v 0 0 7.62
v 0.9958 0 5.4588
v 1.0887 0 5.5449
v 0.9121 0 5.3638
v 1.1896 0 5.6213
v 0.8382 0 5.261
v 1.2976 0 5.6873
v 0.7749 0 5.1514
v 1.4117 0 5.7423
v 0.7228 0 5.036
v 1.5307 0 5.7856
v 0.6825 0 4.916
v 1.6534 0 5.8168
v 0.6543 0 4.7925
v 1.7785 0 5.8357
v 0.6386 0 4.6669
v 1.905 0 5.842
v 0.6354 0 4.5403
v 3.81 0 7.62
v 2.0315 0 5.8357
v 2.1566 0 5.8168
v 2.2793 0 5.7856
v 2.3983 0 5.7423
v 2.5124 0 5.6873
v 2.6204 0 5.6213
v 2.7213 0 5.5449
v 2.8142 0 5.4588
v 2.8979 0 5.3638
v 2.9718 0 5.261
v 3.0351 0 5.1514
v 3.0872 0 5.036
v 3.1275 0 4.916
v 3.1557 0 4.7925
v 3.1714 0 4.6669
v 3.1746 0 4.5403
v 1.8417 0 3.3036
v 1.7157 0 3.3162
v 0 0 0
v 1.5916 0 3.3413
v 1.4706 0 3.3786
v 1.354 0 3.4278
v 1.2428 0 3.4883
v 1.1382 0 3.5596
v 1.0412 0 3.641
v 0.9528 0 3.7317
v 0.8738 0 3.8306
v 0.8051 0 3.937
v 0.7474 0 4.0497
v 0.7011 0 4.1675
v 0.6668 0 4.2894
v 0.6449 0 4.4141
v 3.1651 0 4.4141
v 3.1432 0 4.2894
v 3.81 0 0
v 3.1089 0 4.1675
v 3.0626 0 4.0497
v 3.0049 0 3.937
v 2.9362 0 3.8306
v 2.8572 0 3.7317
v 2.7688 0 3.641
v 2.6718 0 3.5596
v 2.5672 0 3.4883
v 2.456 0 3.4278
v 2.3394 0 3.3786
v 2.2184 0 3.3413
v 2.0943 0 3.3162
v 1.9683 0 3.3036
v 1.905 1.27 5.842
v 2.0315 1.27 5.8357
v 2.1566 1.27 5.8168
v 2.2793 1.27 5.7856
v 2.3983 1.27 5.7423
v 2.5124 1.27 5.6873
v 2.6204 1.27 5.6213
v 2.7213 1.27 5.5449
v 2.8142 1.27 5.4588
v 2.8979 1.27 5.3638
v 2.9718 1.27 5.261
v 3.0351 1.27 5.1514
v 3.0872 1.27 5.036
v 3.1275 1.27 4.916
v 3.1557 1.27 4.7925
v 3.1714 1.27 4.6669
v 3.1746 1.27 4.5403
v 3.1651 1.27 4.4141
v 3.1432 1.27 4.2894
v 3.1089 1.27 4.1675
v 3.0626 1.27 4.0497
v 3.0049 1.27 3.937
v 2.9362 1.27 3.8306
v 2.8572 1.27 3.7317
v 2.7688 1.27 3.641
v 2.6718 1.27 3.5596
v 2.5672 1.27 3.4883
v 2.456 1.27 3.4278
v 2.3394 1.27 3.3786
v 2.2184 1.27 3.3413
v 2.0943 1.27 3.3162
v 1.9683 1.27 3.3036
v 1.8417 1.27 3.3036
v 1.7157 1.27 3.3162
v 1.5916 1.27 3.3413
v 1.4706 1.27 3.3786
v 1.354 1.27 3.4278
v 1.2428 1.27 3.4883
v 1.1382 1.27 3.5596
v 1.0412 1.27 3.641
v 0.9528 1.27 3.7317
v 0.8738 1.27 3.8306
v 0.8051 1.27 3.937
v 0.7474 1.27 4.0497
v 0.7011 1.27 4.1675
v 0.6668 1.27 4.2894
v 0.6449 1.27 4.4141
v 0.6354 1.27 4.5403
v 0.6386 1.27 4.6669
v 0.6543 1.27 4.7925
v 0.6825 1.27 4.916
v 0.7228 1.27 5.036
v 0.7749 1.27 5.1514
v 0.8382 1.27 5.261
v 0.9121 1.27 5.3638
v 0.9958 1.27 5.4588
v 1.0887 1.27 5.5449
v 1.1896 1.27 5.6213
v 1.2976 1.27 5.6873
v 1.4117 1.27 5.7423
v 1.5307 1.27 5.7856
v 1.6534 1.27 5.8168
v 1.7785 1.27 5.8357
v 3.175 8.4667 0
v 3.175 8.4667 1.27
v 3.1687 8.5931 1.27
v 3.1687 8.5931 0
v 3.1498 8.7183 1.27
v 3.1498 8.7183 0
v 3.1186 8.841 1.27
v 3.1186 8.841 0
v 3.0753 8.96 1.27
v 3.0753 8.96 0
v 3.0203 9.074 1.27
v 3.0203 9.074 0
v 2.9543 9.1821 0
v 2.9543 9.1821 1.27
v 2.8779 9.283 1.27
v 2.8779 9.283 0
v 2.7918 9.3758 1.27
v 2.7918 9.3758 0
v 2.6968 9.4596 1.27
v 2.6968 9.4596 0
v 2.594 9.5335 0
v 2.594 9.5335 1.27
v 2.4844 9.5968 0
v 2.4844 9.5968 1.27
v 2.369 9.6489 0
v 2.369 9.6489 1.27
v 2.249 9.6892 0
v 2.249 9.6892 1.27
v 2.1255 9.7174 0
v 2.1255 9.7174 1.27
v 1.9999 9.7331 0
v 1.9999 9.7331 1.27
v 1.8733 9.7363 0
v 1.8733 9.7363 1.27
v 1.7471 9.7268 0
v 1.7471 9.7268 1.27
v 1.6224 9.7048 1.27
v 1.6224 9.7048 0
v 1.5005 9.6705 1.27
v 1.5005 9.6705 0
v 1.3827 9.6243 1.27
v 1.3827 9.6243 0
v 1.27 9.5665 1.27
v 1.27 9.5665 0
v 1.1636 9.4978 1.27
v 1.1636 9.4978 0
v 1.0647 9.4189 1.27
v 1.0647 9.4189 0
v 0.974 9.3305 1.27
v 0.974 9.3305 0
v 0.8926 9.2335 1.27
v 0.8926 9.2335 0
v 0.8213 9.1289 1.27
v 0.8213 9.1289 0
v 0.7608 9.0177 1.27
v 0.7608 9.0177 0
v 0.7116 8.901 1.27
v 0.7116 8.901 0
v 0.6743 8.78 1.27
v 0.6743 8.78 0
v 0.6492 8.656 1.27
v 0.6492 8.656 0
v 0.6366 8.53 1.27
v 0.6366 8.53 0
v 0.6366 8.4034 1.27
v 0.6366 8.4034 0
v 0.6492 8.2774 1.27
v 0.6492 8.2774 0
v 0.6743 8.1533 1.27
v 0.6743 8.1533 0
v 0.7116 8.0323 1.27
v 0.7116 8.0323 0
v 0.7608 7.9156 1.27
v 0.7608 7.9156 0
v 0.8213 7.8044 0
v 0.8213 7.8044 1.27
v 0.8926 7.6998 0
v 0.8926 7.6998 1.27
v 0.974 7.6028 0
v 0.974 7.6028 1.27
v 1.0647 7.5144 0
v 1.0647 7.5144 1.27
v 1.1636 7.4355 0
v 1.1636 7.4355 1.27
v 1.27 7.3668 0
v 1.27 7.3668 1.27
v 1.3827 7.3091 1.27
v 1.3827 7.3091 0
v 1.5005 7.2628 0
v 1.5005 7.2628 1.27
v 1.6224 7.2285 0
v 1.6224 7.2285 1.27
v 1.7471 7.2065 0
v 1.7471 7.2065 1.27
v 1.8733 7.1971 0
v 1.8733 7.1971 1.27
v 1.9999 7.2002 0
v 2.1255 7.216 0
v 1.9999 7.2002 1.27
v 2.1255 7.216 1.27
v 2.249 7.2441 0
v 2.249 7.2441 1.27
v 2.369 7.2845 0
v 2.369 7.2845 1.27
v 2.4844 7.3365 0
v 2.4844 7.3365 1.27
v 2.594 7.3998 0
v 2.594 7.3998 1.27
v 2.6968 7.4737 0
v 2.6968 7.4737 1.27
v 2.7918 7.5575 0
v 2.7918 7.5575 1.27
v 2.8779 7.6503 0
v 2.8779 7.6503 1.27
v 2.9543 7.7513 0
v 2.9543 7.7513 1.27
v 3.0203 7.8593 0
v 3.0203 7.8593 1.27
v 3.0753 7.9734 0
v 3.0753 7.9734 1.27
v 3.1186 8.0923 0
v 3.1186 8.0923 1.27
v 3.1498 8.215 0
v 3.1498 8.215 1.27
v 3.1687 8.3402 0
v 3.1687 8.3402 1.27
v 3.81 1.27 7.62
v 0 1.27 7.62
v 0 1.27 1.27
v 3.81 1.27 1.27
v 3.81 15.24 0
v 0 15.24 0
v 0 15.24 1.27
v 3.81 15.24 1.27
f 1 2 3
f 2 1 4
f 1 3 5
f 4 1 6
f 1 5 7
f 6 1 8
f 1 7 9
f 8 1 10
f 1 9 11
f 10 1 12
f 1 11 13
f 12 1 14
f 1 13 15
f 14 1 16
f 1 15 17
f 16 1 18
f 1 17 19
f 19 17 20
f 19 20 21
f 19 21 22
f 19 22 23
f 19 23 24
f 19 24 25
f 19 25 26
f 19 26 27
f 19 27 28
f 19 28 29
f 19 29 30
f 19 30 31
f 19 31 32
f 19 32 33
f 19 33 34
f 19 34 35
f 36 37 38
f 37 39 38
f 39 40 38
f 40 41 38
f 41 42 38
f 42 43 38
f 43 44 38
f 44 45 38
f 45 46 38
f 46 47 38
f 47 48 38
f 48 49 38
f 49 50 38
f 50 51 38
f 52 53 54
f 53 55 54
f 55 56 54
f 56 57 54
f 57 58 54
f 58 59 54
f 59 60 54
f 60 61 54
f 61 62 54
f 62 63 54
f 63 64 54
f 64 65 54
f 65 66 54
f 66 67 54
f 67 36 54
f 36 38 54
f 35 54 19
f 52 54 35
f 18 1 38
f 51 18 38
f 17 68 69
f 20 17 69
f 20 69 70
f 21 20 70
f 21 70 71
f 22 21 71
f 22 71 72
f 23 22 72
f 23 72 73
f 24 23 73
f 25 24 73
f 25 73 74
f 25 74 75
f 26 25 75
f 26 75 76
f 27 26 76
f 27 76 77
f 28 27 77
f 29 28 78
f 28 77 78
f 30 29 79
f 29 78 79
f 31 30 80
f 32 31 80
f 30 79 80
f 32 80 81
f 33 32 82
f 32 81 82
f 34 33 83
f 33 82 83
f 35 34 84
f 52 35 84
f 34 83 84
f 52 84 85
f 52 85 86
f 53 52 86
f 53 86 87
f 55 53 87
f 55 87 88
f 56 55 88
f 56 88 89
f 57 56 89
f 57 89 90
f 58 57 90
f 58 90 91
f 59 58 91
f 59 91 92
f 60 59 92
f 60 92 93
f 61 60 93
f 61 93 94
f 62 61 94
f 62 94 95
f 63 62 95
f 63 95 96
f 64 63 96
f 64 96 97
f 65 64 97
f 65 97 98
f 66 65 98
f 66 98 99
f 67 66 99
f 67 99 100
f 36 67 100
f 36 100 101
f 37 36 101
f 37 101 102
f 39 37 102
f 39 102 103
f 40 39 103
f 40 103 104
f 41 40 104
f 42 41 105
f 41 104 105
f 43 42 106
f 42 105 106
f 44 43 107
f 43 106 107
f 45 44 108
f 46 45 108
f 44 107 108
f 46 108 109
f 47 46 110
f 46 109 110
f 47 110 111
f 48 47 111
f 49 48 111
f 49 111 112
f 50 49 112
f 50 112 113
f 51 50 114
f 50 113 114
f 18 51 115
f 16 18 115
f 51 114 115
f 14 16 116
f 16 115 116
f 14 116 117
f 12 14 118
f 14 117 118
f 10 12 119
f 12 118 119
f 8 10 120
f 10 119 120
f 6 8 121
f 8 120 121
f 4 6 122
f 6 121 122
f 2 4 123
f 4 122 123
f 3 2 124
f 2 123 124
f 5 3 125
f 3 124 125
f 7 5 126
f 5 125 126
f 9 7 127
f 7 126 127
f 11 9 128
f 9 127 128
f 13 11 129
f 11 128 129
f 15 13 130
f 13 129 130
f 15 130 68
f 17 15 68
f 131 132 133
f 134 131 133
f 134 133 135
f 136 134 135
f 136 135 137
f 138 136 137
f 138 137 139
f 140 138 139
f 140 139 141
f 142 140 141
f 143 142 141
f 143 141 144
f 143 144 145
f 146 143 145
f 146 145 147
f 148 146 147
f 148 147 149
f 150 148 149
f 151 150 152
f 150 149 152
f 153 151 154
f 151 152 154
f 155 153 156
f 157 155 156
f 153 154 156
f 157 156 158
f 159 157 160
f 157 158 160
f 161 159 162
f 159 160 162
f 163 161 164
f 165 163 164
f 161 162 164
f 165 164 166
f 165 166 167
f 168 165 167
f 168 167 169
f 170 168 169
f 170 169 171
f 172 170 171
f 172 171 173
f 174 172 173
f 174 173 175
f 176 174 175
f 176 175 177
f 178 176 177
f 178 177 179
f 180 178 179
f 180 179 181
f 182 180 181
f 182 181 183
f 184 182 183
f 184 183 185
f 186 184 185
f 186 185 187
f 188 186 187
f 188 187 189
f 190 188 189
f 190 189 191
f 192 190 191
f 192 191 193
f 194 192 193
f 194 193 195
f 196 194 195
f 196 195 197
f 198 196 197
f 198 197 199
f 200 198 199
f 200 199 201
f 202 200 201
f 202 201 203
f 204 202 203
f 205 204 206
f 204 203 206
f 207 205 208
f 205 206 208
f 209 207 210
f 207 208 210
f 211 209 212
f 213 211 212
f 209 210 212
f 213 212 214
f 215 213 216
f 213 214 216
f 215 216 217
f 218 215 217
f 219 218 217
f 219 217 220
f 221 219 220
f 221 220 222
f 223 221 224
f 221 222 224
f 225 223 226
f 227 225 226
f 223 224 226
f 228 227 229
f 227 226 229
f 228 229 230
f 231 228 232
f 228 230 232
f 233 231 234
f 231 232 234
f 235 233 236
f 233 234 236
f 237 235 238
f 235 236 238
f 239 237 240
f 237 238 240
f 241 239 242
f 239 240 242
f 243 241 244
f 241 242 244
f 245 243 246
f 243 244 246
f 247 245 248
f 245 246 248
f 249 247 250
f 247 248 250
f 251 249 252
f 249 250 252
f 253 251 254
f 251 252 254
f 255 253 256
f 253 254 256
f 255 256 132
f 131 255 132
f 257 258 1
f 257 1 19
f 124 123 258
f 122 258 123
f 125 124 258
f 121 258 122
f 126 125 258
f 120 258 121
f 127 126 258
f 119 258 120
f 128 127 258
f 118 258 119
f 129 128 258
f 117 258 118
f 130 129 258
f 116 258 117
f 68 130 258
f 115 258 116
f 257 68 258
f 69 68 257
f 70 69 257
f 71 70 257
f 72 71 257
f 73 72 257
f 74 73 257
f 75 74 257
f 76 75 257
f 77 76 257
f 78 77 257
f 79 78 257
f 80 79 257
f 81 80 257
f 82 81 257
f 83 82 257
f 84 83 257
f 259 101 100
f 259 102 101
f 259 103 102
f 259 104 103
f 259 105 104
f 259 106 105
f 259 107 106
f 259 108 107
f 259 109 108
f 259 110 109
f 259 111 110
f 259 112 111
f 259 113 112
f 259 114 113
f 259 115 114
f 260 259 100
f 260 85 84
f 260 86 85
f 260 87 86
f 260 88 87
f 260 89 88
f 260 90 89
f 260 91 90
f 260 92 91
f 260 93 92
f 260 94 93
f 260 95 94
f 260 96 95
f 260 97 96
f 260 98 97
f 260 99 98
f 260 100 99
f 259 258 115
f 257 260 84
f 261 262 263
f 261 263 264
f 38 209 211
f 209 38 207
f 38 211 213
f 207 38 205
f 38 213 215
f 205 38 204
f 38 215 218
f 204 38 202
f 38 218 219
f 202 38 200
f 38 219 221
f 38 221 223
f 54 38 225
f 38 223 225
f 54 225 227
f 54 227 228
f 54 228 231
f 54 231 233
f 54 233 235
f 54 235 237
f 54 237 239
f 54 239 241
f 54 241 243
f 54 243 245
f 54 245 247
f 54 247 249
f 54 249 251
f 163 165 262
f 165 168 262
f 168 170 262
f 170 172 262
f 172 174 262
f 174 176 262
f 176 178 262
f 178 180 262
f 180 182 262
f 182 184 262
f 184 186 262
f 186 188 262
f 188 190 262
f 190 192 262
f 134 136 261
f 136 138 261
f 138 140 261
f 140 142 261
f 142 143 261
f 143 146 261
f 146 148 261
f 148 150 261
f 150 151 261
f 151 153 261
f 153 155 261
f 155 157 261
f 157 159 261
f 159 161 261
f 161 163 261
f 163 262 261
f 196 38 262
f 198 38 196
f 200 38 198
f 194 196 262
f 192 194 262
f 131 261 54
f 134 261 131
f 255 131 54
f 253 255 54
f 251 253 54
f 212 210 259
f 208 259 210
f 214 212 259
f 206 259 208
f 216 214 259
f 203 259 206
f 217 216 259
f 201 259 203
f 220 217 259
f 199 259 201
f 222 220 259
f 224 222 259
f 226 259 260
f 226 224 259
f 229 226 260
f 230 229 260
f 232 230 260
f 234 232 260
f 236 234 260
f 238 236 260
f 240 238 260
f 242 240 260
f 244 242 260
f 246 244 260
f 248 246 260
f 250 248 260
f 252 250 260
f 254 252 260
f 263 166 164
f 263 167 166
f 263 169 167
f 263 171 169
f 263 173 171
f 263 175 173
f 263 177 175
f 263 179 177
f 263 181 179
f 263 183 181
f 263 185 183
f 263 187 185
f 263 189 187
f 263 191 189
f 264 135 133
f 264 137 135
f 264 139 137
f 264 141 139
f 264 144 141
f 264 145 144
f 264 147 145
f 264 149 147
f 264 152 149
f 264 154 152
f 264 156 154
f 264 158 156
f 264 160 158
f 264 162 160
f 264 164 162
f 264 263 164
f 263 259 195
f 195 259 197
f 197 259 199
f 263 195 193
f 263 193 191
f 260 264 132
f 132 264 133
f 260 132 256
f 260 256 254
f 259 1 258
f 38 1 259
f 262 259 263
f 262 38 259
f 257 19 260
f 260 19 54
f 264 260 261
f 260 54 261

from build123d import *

# Parameters (mm, degrees)
SKETCH1_W           = 3.81
SKETCH1_H           = 15.24
BOSS_EXTRUDE1_DEPTH = 1.27
SKETCH2_W           = 3.81
SKETCH2_H           = 1.27
BOSS_EXTRUDE2_DEPTH = 6.35
SKETCH6_R           = 1.27
CUT_EXTRUDE1_DEPTH  = 6.35
SKETCH4_R           = 1.27
CUT_EXTRUDE2_DEPTH  = 6.35


with BuildPart() as part:
    # Sketch1 → Boss-Extrude1 (new body)
    with BuildSketch(Plane.XY):
        with Locations((1.905, 7.62)):
            Rectangle(SKETCH1_W, SKETCH1_H)
    extrude(amount=BOSS_EXTRUDE1_DEPTH)

    # Sketch2 → Boss-Extrude2 (add)
    with BuildSketch(Plane.XY.offset(1.27)):
        with Locations((1.905, 0.635)):
            Rectangle(SKETCH2_W, SKETCH2_H)
    extrude(amount=BOSS_EXTRUDE2_DEPTH)

    # Sketch6 → Cut-Extrude1 (cut)
    with BuildSketch(Plane(origin=(0, 1.27, 0), x_dir=(1, 0, 0), z_dir=(0, 1, 0))):
        with Locations(Location((1.905, -4.572, 0), (0, 0, 270))):
            Circle(SKETCH6_R)
    extrude(amount=-CUT_EXTRUDE1_DEPTH, mode=Mode.SUBTRACT)

    # Sketch4 → Cut-Extrude2 (cut)
    with BuildSketch(Plane.XY.offset(1.27)):
        with Locations((1.905, 8.466666667)):
            Circle(SKETCH4_R)
    extrude(amount=-CUT_EXTRUDE2_DEPTH, mode=Mode.SUBTRACT)


solid = part.part
